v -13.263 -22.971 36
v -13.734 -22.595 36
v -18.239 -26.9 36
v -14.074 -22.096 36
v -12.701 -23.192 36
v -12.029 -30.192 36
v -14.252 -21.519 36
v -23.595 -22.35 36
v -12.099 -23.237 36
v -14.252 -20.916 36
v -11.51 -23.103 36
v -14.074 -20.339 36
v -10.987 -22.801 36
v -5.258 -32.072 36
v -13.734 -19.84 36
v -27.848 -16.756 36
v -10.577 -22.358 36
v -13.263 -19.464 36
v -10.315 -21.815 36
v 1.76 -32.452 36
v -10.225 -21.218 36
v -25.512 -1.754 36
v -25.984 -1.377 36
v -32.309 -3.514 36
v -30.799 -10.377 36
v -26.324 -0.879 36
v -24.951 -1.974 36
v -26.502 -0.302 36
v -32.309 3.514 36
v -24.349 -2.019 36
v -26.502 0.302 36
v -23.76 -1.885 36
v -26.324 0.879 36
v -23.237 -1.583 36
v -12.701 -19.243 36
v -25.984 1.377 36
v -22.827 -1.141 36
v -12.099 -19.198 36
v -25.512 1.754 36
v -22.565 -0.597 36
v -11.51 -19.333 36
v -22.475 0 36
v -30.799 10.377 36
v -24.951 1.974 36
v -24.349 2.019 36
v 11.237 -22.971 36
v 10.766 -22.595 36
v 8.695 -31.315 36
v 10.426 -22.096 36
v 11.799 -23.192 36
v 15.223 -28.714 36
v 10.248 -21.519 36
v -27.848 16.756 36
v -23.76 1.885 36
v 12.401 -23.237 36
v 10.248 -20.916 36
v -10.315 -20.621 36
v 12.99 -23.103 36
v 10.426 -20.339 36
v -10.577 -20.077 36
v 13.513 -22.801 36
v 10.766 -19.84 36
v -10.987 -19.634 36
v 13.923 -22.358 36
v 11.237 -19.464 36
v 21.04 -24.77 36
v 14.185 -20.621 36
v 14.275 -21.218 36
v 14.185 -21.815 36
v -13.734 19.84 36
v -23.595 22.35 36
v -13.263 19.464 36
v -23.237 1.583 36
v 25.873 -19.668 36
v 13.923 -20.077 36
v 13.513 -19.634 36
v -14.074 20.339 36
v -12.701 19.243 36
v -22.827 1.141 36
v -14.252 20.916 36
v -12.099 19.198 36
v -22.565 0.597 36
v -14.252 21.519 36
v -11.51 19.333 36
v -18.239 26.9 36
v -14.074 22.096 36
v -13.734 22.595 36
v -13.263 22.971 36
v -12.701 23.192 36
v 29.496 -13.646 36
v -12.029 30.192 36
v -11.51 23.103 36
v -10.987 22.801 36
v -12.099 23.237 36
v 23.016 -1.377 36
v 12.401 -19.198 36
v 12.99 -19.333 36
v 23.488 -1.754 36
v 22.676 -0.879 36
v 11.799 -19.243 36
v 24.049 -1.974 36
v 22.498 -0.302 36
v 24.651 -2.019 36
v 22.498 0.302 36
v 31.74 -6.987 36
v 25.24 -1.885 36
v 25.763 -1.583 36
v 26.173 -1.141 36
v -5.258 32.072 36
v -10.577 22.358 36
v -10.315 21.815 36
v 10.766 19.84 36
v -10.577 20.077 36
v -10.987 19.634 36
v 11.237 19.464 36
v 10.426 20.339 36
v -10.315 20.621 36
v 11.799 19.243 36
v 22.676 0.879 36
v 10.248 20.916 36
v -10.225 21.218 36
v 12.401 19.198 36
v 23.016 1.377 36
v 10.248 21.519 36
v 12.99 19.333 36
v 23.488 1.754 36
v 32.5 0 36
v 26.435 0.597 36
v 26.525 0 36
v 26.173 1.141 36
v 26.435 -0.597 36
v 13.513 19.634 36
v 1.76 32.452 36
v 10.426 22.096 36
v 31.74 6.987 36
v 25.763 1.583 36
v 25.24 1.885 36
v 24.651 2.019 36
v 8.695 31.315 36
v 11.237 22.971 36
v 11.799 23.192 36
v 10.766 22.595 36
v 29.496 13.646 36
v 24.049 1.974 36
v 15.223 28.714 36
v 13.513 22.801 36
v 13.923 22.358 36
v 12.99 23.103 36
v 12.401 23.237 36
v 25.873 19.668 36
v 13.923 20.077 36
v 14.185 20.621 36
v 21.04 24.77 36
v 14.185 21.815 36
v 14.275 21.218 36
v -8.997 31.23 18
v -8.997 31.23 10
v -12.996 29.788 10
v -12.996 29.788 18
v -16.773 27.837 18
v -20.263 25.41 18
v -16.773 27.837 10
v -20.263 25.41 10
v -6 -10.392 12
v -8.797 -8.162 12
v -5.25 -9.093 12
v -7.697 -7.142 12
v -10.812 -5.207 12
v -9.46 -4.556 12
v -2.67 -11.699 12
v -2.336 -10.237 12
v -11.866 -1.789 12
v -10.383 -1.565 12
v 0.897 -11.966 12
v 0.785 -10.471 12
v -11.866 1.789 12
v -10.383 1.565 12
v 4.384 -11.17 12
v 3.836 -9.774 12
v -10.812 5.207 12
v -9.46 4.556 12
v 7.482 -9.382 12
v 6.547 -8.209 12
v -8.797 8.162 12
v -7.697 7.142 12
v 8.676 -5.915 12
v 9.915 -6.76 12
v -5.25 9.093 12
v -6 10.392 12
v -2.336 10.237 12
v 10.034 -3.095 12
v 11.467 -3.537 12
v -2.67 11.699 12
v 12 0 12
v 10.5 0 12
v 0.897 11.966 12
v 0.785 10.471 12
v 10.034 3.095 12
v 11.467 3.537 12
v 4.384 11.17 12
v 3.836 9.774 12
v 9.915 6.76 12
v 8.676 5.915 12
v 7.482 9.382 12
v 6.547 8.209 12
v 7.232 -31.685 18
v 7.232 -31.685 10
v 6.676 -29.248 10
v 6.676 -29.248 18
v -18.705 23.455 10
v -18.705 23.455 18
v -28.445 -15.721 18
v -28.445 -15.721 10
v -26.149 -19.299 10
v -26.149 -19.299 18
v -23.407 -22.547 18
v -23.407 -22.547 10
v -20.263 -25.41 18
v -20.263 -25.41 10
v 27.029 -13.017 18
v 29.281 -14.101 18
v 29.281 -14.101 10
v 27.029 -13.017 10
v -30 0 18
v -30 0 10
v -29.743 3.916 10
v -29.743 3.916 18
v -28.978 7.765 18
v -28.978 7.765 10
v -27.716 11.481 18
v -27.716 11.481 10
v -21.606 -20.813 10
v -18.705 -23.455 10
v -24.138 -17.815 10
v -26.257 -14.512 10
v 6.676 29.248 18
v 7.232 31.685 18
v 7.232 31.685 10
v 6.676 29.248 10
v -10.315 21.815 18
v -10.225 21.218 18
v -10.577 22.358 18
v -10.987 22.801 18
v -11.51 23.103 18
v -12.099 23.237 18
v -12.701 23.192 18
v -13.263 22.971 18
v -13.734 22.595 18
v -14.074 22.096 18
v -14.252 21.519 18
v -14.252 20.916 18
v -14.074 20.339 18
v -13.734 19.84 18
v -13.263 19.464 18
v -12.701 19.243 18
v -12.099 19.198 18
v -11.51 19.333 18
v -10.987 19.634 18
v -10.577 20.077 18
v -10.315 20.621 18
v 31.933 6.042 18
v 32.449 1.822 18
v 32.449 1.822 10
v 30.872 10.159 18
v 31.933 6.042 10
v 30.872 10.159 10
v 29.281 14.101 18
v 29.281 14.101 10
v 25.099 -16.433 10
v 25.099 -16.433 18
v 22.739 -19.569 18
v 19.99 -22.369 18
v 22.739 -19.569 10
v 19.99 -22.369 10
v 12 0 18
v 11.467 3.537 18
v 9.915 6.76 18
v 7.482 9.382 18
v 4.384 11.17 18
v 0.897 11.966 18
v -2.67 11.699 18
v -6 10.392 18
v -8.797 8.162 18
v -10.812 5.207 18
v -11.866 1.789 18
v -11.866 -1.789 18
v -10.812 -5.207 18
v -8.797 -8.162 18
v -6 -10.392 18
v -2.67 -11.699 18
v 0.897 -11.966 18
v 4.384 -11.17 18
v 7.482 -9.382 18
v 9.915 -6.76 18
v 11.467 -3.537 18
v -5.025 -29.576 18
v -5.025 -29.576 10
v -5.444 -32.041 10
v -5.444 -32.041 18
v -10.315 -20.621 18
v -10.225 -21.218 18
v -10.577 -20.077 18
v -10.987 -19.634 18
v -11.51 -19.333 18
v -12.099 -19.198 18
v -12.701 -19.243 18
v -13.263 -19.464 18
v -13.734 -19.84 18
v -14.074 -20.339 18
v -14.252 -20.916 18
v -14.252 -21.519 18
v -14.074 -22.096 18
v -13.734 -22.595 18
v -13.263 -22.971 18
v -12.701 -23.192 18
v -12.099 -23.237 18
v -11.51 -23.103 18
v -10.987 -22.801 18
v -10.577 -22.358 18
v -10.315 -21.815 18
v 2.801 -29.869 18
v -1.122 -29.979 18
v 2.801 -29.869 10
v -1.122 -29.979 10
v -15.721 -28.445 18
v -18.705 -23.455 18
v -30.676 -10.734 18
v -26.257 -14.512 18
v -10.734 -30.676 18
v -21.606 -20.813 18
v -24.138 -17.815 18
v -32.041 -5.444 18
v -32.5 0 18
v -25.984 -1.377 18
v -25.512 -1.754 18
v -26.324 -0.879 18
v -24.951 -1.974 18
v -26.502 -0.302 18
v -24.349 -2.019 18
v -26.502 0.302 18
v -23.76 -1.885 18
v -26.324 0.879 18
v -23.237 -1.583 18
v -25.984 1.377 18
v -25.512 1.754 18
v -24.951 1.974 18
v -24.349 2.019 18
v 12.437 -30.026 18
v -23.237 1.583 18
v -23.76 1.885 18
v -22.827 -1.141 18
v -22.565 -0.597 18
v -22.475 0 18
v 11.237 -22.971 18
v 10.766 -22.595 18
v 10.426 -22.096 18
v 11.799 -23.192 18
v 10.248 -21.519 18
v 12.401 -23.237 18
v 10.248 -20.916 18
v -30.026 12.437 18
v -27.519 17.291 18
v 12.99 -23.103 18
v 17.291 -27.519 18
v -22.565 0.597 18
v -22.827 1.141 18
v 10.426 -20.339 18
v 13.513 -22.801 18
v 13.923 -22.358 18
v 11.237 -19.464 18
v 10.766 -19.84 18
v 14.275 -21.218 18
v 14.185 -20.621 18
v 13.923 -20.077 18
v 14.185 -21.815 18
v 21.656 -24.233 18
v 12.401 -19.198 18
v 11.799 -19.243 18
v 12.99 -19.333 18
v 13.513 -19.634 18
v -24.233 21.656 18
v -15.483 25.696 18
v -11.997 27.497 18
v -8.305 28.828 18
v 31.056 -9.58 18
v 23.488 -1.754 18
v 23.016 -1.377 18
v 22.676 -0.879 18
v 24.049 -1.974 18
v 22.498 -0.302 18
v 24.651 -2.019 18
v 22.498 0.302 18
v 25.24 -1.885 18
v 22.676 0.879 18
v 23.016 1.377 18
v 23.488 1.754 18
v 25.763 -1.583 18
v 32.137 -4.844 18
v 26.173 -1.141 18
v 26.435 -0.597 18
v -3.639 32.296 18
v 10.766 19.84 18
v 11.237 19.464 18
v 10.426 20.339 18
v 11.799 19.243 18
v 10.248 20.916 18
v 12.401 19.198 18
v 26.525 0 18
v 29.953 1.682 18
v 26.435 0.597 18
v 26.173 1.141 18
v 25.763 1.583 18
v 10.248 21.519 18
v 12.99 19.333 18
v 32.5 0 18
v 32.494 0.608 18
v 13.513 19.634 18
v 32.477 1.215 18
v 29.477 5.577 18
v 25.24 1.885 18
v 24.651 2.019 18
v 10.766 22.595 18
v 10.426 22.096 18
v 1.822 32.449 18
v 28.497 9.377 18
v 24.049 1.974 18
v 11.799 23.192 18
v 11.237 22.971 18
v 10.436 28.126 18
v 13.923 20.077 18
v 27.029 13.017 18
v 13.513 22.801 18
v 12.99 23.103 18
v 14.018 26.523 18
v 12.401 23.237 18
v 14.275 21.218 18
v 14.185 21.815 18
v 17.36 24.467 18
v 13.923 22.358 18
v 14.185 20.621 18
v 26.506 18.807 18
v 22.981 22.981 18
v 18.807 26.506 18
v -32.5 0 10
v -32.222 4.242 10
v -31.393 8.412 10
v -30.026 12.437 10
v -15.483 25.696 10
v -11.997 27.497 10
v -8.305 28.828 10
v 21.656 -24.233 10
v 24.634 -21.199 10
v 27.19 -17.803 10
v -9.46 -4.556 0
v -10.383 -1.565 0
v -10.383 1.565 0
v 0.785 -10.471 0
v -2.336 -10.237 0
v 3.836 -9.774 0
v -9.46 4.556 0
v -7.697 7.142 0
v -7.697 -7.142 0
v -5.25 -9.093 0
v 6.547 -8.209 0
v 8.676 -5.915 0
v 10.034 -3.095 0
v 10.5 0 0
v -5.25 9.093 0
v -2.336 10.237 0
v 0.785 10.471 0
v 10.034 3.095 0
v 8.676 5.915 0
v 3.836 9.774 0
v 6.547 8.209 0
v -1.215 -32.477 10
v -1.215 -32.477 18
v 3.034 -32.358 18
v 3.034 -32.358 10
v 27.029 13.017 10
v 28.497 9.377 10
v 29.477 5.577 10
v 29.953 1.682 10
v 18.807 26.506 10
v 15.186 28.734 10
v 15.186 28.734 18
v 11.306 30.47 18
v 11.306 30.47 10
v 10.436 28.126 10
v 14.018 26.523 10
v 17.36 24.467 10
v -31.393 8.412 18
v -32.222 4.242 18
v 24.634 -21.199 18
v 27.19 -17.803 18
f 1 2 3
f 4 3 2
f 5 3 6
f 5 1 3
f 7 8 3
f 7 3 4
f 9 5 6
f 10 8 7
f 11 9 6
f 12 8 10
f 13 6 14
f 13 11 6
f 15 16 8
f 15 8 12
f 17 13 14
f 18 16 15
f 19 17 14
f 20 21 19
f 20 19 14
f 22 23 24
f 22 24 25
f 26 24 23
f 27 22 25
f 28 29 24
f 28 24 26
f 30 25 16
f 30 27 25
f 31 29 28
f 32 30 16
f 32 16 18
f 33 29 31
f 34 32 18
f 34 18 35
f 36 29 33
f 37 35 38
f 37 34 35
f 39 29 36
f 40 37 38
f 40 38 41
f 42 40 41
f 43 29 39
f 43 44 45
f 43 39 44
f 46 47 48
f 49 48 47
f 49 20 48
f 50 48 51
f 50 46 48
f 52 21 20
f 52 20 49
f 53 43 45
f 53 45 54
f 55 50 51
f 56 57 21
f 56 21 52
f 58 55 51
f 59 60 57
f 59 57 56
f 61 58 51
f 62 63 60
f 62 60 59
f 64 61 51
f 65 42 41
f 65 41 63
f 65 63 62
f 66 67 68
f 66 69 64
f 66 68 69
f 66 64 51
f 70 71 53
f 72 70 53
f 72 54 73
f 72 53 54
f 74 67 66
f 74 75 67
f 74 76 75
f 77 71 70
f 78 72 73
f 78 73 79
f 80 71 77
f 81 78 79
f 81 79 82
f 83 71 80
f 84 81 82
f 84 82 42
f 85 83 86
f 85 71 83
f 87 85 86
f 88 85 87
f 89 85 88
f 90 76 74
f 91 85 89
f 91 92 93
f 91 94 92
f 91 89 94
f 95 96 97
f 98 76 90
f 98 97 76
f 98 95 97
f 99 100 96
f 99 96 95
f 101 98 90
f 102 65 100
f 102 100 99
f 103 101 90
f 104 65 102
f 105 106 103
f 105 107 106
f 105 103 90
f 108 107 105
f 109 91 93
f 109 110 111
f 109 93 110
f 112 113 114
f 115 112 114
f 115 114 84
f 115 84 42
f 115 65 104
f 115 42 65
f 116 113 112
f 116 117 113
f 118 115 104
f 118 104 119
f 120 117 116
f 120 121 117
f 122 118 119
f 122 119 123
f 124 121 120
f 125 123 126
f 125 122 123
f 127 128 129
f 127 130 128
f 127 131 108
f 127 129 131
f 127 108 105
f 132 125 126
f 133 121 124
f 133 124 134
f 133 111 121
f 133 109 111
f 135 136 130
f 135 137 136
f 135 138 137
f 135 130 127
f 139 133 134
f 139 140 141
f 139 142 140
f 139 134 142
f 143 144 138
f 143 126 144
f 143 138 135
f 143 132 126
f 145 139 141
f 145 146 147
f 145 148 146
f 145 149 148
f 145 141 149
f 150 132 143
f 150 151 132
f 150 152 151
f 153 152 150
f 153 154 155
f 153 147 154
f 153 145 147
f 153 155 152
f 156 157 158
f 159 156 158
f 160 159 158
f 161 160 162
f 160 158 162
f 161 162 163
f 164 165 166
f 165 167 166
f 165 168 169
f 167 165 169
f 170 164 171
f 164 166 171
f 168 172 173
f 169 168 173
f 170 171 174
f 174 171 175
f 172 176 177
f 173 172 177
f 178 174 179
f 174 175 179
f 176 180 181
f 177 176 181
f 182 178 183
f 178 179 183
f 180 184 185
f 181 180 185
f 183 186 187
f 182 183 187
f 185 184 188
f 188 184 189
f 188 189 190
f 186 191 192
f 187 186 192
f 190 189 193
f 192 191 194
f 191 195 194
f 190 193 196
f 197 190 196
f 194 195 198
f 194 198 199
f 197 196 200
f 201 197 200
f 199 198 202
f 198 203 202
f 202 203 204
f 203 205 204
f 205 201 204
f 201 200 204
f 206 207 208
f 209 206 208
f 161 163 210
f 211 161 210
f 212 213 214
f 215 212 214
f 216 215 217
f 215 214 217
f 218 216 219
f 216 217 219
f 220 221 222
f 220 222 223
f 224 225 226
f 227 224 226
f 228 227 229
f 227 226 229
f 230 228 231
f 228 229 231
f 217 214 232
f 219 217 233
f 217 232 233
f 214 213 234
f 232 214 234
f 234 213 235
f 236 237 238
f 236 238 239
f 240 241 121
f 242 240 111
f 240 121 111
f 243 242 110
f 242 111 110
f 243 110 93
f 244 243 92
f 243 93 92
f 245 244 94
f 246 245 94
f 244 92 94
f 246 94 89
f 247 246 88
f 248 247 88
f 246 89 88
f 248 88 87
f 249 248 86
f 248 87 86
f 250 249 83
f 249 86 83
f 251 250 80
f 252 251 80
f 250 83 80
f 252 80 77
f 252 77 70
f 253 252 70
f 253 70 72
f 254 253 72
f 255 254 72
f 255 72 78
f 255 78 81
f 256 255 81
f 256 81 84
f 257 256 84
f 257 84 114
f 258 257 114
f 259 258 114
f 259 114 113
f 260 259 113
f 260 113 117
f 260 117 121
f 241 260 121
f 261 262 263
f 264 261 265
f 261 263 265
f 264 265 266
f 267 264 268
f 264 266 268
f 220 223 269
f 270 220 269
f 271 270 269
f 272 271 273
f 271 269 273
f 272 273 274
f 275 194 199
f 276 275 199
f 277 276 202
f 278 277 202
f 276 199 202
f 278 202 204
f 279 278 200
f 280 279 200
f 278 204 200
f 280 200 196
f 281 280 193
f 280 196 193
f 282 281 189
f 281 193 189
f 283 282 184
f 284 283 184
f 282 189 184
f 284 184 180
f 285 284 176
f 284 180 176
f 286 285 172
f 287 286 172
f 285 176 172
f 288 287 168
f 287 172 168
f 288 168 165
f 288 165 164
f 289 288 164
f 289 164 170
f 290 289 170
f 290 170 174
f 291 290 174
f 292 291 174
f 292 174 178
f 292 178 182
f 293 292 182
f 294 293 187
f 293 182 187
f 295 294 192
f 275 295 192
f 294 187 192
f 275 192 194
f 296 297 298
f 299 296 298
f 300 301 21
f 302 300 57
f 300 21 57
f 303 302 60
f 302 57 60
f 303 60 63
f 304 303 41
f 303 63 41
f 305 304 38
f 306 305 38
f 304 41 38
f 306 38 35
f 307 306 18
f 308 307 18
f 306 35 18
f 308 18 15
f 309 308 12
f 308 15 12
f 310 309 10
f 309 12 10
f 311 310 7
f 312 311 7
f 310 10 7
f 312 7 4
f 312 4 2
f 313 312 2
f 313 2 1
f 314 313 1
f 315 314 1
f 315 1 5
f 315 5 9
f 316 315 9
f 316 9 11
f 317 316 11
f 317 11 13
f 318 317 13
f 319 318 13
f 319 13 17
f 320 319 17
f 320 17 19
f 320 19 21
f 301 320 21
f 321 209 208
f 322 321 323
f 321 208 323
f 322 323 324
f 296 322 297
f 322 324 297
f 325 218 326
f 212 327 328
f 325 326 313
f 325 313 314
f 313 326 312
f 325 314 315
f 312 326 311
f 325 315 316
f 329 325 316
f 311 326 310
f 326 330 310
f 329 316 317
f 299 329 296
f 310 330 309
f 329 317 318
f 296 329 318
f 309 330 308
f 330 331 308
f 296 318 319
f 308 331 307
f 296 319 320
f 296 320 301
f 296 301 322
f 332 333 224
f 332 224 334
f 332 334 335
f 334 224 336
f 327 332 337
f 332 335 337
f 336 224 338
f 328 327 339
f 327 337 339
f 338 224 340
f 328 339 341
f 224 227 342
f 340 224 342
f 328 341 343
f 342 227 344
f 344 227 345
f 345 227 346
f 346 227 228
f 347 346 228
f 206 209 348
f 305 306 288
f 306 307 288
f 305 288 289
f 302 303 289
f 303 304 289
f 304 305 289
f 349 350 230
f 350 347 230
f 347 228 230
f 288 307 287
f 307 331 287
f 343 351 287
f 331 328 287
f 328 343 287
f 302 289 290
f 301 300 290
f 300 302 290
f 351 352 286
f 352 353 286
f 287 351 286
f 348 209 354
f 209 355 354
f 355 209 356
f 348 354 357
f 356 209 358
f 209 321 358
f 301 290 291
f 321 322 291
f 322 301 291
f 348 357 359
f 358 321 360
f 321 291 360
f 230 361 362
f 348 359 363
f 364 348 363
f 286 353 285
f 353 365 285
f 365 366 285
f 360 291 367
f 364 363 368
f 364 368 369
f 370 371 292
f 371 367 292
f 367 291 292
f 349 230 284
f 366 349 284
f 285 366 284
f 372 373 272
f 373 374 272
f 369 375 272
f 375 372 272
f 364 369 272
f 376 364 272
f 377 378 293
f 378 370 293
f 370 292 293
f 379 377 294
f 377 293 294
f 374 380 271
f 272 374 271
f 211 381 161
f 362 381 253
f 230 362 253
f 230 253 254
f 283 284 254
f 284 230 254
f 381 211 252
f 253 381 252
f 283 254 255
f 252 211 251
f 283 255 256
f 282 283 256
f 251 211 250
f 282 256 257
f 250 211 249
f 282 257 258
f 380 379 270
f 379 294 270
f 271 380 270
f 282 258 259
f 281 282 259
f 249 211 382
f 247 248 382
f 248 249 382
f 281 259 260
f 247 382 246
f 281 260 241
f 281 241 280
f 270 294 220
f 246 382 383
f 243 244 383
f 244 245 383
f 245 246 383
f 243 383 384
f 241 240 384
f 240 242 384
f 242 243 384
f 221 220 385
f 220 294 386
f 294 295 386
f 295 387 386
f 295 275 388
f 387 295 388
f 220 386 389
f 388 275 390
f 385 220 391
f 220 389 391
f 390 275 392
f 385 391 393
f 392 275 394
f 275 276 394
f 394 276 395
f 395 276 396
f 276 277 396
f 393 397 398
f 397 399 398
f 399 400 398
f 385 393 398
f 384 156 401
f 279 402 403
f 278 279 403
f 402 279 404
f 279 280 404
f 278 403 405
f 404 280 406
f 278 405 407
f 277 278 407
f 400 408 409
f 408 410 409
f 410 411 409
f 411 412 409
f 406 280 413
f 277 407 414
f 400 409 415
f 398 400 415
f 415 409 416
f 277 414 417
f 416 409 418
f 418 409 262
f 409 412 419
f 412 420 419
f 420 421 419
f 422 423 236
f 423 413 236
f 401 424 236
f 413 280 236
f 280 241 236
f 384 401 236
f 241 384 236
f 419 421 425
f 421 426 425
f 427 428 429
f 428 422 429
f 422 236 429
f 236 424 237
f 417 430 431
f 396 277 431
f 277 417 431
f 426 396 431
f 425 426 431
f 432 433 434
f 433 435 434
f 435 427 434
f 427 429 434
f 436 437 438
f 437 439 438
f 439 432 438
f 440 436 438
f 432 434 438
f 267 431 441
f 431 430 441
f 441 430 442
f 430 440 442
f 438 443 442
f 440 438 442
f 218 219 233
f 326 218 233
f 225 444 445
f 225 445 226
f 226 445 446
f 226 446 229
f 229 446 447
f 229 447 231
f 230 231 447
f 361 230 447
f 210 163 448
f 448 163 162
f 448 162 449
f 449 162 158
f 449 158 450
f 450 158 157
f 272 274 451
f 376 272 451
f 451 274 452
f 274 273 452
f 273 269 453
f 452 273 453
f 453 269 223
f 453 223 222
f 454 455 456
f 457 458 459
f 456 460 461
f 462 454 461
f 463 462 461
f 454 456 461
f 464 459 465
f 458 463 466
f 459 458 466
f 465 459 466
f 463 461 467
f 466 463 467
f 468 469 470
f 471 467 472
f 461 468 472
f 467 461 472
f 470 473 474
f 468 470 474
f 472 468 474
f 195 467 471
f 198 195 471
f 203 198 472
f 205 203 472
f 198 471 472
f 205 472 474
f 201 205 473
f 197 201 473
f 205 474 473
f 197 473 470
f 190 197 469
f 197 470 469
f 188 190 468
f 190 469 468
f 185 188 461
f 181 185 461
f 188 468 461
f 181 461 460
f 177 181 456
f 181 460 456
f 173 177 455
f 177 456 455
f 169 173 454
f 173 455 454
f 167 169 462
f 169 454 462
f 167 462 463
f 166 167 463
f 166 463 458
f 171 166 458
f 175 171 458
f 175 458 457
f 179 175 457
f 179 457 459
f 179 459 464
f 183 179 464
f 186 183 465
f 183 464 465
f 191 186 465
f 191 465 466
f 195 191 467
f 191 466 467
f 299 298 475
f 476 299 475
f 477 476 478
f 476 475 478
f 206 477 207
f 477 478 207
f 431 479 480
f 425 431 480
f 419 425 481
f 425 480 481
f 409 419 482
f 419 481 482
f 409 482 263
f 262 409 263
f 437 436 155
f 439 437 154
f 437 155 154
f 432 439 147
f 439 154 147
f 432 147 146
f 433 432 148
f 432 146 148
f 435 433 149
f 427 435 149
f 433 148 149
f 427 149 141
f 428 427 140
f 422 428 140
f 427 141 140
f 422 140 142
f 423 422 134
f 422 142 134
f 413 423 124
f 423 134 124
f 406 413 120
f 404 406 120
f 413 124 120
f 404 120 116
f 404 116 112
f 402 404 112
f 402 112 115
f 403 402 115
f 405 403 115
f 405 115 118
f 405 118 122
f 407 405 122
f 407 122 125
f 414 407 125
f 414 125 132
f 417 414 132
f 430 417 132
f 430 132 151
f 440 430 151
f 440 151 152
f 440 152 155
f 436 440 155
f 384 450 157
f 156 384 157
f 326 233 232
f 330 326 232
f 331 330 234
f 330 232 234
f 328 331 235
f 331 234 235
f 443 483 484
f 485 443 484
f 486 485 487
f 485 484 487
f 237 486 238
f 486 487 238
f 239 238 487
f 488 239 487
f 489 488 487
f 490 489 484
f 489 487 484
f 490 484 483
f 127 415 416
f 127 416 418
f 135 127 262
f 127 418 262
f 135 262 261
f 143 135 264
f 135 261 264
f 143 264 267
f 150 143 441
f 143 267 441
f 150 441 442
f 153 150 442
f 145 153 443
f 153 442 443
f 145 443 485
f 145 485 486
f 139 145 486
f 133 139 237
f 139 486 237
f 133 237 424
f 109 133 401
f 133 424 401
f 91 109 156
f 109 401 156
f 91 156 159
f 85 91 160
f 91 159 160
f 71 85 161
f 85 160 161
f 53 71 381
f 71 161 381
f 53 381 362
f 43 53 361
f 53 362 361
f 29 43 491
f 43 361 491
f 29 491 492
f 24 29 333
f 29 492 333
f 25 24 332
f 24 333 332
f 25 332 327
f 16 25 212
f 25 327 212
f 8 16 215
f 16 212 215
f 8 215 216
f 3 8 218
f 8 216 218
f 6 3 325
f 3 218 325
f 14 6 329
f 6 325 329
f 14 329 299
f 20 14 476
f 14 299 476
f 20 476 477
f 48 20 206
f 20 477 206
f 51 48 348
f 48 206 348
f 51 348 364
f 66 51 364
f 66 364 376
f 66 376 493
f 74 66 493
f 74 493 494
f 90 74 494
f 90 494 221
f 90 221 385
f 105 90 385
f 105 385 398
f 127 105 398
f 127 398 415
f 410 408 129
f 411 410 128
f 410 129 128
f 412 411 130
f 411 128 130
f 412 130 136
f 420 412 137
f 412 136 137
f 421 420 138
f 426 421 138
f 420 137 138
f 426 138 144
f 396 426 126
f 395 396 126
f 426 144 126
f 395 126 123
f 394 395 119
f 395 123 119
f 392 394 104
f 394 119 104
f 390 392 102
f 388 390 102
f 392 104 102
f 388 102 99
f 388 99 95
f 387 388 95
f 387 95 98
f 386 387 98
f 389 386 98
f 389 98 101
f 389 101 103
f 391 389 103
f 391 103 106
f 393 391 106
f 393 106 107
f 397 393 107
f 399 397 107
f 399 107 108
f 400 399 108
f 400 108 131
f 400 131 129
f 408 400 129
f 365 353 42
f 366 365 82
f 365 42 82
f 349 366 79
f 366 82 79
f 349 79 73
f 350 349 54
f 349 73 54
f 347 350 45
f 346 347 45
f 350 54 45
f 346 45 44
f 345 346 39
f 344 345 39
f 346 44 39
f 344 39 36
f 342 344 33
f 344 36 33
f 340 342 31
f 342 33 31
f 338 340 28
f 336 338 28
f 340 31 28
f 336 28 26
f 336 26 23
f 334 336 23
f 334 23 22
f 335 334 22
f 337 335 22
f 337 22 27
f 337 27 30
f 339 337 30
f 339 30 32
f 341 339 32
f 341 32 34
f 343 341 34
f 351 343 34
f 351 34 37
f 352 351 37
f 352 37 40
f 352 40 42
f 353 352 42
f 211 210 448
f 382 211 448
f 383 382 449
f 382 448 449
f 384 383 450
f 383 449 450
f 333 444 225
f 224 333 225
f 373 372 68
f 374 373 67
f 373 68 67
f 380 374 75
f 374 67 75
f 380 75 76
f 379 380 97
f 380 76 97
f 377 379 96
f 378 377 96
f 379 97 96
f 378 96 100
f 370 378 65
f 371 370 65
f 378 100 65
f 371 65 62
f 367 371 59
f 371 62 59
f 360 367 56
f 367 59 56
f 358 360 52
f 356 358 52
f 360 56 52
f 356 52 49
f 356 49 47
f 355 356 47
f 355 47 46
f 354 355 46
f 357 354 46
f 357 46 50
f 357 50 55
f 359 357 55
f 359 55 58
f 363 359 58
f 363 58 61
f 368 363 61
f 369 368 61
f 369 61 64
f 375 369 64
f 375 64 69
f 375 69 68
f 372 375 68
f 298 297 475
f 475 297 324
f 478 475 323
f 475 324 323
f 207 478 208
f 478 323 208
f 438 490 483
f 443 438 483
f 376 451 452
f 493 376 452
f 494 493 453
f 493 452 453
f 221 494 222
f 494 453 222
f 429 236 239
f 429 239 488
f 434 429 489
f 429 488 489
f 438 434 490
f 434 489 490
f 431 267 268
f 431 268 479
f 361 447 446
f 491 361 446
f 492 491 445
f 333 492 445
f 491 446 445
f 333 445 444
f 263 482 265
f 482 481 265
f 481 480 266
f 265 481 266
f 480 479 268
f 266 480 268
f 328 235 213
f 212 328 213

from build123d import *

# Parameters (mm, degrees)
SKETCH1_R           = 10.5
BOSS_EXTRUDE1_DEPTH = 12
SKETCH2_R           = 12
BOSS_EXTRUDE2_DEPTH = 6
SKETCH3_R           = 32.5
BOSS_EXTRUDE3_DEPTH = 18
SKETCH4_R           = 2.025
CUT_EXTRUDE1_DEPTH  = 59.38236035
BOSS_EXTRUDE4_START = 8
BOSS_EXTRUDE4_DEPTH = 8


with BuildPart() as part:
    # Sketch1 → Boss-Extrude1 (new body)
    with BuildSketch(Plane.XY):
        Circle(SKETCH1_R)
    extrude(amount=BOSS_EXTRUDE1_DEPTH)

    # Sketch2 → Boss-Extrude2 (add)
    with BuildSketch(Plane.XY.offset(12)):
        Circle(SKETCH2_R)
    extrude(amount=BOSS_EXTRUDE2_DEPTH)

    # Sketch3 → Boss-Extrude3 (add)
    with BuildSketch(Plane.XY.offset(18)):
        Circle(SKETCH3_R)
    extrude(amount=BOSS_EXTRUDE3_DEPTH)

    # Sketch4 → Cut-Extrude1 (cut, through all)
    with BuildSketch(Plane.XY.offset(36)):
        with Locations((24.5, 0)):
            Circle(SKETCH4_R)
        with Locations((12.25, -21.217622393)):
            Circle(SKETCH4_R)
        with Locations((-12.25, -21.217622393)):
            Circle(SKETCH4_R)
        with Locations((-24.5, 0)):
            Circle(SKETCH4_R)
        with Locations((-12.25, 21.217622393)):
            Circle(SKETCH4_R)
        with Locations((12.25, 21.217622393)):
            Circle(SKETCH4_R)
    extrude(amount=-CUT_EXTRUDE1_DEPTH, mode=Mode.SUBTRACT)

    # Sketch5 → Boss-Extrude4 (add)
    with BuildSketch(Plane(origin=(0, 0, 18), x_dir=(-1, 0, 0), z_dir=(0, 0, -1)).offset(BOSS_EXTRUDE4_START)):
        with BuildLine():
            Line((27.716385975, 11.480502971), (30.026084807, 12.437211552))
            ThreePointArc((30.026084807, 12.437211552), (31.875521613, 6.340435466), (32.5, 0))
            Line((32.5, 0), (30, 0))
            ThreePointArc((30, 0), (29.423558412, 5.85270966), (27.716385975, 11.480502971))
        make_face()
        with BuildLine():
            Line((26.256702657, -14.511566613), (28.444761212, -15.720863831))
            ThreePointArc((28.444761212, -15.720863831), (24.831214714, -20.968089465), (20.26341856, -25.40952318))
            Line((20.26341856, -25.40952318), (18.704694056, -23.454944474))
            ThreePointArc((18.704694056, -23.454944474), (22.921121275, -19.355159506), (26.256702657, -14.511566613))
        make_face()
        with BuildLine():
            Line((5.025186699, -29.576130556), (5.443952257, -32.040808102))
            ThreePointArc((5.443952257, -32.040808102), (-0.911503329, -32.487215357), (-7.231930354, -31.685157146))
            Line((-7.231930354, -31.685157146), (-6.675628019, -29.247837365))
            ThreePointArc((-6.675628019, -29.247837365), (-0.841387688, -29.988198791), (5.025186699, -29.576130556))
        make_face()
        with BuildLine():
            Line((-19.990397339, -22.369264946), (-21.656263783, -24.233370359))
            ThreePointArc((-21.656263783, -24.233370359), (-25.967840774, -19.542805467), (-29.281488207, -14.101221521))
            Line((-29.281488207, -14.101221521), (-27.029066037, -13.016512174))
            ThreePointArc((-27.029066037, -13.016512174), (-23.970314561, -18.039512739), (-19.990397339, -22.369264946))
        make_face()
        with BuildLine():
            Line((-29.952804451, 1.682113417), (-32.448871488, 1.822289535))
            ThreePointArc((-32.448871488, 1.822289535), (-31.469864469, 8.11773554), (-29.281488207, 14.101221521))
            Line((-29.281488207, 14.101221521), (-27.029066037, 13.016512174))
            ThreePointArc((-27.029066037, 13.016512174), (-29.049105664, 7.493294345), (-29.952804451, 1.682113417))
        make_face()
        with BuildLine():
            Line((-17.360138885, 24.466826069), (-18.806817126, 26.505728241))
            ThreePointArc((-18.806817126, 26.505728241), (-13.27443835, 29.665456114), (-7.231930354, 31.685157146))
            Line((-7.231930354, 31.685157146), (-6.675628019, 29.247837365))
            ThreePointArc((-6.675628019, 29.247837365), (-12.253327708, 27.383497952), (-17.360138885, 24.466826069))
        make_face()
        with BuildLine():
            Line((8.305065343, 28.827519658), (8.997154121, 31.229812963))
            ThreePointArc((8.997154121, 31.229812963), (14.916910595, 28.874483169), (20.26341856, 25.40952318))
            Line((20.26341856, 25.40952318), (18.704694056, 23.454944474))
            ThreePointArc((18.704694056, 23.454944474), (13.769455934, 26.653369079), (8.305065343, 28.827519658))
        make_face()
    extrude(amount=-BOSS_EXTRUDE4_DEPTH)


solid = part.part
